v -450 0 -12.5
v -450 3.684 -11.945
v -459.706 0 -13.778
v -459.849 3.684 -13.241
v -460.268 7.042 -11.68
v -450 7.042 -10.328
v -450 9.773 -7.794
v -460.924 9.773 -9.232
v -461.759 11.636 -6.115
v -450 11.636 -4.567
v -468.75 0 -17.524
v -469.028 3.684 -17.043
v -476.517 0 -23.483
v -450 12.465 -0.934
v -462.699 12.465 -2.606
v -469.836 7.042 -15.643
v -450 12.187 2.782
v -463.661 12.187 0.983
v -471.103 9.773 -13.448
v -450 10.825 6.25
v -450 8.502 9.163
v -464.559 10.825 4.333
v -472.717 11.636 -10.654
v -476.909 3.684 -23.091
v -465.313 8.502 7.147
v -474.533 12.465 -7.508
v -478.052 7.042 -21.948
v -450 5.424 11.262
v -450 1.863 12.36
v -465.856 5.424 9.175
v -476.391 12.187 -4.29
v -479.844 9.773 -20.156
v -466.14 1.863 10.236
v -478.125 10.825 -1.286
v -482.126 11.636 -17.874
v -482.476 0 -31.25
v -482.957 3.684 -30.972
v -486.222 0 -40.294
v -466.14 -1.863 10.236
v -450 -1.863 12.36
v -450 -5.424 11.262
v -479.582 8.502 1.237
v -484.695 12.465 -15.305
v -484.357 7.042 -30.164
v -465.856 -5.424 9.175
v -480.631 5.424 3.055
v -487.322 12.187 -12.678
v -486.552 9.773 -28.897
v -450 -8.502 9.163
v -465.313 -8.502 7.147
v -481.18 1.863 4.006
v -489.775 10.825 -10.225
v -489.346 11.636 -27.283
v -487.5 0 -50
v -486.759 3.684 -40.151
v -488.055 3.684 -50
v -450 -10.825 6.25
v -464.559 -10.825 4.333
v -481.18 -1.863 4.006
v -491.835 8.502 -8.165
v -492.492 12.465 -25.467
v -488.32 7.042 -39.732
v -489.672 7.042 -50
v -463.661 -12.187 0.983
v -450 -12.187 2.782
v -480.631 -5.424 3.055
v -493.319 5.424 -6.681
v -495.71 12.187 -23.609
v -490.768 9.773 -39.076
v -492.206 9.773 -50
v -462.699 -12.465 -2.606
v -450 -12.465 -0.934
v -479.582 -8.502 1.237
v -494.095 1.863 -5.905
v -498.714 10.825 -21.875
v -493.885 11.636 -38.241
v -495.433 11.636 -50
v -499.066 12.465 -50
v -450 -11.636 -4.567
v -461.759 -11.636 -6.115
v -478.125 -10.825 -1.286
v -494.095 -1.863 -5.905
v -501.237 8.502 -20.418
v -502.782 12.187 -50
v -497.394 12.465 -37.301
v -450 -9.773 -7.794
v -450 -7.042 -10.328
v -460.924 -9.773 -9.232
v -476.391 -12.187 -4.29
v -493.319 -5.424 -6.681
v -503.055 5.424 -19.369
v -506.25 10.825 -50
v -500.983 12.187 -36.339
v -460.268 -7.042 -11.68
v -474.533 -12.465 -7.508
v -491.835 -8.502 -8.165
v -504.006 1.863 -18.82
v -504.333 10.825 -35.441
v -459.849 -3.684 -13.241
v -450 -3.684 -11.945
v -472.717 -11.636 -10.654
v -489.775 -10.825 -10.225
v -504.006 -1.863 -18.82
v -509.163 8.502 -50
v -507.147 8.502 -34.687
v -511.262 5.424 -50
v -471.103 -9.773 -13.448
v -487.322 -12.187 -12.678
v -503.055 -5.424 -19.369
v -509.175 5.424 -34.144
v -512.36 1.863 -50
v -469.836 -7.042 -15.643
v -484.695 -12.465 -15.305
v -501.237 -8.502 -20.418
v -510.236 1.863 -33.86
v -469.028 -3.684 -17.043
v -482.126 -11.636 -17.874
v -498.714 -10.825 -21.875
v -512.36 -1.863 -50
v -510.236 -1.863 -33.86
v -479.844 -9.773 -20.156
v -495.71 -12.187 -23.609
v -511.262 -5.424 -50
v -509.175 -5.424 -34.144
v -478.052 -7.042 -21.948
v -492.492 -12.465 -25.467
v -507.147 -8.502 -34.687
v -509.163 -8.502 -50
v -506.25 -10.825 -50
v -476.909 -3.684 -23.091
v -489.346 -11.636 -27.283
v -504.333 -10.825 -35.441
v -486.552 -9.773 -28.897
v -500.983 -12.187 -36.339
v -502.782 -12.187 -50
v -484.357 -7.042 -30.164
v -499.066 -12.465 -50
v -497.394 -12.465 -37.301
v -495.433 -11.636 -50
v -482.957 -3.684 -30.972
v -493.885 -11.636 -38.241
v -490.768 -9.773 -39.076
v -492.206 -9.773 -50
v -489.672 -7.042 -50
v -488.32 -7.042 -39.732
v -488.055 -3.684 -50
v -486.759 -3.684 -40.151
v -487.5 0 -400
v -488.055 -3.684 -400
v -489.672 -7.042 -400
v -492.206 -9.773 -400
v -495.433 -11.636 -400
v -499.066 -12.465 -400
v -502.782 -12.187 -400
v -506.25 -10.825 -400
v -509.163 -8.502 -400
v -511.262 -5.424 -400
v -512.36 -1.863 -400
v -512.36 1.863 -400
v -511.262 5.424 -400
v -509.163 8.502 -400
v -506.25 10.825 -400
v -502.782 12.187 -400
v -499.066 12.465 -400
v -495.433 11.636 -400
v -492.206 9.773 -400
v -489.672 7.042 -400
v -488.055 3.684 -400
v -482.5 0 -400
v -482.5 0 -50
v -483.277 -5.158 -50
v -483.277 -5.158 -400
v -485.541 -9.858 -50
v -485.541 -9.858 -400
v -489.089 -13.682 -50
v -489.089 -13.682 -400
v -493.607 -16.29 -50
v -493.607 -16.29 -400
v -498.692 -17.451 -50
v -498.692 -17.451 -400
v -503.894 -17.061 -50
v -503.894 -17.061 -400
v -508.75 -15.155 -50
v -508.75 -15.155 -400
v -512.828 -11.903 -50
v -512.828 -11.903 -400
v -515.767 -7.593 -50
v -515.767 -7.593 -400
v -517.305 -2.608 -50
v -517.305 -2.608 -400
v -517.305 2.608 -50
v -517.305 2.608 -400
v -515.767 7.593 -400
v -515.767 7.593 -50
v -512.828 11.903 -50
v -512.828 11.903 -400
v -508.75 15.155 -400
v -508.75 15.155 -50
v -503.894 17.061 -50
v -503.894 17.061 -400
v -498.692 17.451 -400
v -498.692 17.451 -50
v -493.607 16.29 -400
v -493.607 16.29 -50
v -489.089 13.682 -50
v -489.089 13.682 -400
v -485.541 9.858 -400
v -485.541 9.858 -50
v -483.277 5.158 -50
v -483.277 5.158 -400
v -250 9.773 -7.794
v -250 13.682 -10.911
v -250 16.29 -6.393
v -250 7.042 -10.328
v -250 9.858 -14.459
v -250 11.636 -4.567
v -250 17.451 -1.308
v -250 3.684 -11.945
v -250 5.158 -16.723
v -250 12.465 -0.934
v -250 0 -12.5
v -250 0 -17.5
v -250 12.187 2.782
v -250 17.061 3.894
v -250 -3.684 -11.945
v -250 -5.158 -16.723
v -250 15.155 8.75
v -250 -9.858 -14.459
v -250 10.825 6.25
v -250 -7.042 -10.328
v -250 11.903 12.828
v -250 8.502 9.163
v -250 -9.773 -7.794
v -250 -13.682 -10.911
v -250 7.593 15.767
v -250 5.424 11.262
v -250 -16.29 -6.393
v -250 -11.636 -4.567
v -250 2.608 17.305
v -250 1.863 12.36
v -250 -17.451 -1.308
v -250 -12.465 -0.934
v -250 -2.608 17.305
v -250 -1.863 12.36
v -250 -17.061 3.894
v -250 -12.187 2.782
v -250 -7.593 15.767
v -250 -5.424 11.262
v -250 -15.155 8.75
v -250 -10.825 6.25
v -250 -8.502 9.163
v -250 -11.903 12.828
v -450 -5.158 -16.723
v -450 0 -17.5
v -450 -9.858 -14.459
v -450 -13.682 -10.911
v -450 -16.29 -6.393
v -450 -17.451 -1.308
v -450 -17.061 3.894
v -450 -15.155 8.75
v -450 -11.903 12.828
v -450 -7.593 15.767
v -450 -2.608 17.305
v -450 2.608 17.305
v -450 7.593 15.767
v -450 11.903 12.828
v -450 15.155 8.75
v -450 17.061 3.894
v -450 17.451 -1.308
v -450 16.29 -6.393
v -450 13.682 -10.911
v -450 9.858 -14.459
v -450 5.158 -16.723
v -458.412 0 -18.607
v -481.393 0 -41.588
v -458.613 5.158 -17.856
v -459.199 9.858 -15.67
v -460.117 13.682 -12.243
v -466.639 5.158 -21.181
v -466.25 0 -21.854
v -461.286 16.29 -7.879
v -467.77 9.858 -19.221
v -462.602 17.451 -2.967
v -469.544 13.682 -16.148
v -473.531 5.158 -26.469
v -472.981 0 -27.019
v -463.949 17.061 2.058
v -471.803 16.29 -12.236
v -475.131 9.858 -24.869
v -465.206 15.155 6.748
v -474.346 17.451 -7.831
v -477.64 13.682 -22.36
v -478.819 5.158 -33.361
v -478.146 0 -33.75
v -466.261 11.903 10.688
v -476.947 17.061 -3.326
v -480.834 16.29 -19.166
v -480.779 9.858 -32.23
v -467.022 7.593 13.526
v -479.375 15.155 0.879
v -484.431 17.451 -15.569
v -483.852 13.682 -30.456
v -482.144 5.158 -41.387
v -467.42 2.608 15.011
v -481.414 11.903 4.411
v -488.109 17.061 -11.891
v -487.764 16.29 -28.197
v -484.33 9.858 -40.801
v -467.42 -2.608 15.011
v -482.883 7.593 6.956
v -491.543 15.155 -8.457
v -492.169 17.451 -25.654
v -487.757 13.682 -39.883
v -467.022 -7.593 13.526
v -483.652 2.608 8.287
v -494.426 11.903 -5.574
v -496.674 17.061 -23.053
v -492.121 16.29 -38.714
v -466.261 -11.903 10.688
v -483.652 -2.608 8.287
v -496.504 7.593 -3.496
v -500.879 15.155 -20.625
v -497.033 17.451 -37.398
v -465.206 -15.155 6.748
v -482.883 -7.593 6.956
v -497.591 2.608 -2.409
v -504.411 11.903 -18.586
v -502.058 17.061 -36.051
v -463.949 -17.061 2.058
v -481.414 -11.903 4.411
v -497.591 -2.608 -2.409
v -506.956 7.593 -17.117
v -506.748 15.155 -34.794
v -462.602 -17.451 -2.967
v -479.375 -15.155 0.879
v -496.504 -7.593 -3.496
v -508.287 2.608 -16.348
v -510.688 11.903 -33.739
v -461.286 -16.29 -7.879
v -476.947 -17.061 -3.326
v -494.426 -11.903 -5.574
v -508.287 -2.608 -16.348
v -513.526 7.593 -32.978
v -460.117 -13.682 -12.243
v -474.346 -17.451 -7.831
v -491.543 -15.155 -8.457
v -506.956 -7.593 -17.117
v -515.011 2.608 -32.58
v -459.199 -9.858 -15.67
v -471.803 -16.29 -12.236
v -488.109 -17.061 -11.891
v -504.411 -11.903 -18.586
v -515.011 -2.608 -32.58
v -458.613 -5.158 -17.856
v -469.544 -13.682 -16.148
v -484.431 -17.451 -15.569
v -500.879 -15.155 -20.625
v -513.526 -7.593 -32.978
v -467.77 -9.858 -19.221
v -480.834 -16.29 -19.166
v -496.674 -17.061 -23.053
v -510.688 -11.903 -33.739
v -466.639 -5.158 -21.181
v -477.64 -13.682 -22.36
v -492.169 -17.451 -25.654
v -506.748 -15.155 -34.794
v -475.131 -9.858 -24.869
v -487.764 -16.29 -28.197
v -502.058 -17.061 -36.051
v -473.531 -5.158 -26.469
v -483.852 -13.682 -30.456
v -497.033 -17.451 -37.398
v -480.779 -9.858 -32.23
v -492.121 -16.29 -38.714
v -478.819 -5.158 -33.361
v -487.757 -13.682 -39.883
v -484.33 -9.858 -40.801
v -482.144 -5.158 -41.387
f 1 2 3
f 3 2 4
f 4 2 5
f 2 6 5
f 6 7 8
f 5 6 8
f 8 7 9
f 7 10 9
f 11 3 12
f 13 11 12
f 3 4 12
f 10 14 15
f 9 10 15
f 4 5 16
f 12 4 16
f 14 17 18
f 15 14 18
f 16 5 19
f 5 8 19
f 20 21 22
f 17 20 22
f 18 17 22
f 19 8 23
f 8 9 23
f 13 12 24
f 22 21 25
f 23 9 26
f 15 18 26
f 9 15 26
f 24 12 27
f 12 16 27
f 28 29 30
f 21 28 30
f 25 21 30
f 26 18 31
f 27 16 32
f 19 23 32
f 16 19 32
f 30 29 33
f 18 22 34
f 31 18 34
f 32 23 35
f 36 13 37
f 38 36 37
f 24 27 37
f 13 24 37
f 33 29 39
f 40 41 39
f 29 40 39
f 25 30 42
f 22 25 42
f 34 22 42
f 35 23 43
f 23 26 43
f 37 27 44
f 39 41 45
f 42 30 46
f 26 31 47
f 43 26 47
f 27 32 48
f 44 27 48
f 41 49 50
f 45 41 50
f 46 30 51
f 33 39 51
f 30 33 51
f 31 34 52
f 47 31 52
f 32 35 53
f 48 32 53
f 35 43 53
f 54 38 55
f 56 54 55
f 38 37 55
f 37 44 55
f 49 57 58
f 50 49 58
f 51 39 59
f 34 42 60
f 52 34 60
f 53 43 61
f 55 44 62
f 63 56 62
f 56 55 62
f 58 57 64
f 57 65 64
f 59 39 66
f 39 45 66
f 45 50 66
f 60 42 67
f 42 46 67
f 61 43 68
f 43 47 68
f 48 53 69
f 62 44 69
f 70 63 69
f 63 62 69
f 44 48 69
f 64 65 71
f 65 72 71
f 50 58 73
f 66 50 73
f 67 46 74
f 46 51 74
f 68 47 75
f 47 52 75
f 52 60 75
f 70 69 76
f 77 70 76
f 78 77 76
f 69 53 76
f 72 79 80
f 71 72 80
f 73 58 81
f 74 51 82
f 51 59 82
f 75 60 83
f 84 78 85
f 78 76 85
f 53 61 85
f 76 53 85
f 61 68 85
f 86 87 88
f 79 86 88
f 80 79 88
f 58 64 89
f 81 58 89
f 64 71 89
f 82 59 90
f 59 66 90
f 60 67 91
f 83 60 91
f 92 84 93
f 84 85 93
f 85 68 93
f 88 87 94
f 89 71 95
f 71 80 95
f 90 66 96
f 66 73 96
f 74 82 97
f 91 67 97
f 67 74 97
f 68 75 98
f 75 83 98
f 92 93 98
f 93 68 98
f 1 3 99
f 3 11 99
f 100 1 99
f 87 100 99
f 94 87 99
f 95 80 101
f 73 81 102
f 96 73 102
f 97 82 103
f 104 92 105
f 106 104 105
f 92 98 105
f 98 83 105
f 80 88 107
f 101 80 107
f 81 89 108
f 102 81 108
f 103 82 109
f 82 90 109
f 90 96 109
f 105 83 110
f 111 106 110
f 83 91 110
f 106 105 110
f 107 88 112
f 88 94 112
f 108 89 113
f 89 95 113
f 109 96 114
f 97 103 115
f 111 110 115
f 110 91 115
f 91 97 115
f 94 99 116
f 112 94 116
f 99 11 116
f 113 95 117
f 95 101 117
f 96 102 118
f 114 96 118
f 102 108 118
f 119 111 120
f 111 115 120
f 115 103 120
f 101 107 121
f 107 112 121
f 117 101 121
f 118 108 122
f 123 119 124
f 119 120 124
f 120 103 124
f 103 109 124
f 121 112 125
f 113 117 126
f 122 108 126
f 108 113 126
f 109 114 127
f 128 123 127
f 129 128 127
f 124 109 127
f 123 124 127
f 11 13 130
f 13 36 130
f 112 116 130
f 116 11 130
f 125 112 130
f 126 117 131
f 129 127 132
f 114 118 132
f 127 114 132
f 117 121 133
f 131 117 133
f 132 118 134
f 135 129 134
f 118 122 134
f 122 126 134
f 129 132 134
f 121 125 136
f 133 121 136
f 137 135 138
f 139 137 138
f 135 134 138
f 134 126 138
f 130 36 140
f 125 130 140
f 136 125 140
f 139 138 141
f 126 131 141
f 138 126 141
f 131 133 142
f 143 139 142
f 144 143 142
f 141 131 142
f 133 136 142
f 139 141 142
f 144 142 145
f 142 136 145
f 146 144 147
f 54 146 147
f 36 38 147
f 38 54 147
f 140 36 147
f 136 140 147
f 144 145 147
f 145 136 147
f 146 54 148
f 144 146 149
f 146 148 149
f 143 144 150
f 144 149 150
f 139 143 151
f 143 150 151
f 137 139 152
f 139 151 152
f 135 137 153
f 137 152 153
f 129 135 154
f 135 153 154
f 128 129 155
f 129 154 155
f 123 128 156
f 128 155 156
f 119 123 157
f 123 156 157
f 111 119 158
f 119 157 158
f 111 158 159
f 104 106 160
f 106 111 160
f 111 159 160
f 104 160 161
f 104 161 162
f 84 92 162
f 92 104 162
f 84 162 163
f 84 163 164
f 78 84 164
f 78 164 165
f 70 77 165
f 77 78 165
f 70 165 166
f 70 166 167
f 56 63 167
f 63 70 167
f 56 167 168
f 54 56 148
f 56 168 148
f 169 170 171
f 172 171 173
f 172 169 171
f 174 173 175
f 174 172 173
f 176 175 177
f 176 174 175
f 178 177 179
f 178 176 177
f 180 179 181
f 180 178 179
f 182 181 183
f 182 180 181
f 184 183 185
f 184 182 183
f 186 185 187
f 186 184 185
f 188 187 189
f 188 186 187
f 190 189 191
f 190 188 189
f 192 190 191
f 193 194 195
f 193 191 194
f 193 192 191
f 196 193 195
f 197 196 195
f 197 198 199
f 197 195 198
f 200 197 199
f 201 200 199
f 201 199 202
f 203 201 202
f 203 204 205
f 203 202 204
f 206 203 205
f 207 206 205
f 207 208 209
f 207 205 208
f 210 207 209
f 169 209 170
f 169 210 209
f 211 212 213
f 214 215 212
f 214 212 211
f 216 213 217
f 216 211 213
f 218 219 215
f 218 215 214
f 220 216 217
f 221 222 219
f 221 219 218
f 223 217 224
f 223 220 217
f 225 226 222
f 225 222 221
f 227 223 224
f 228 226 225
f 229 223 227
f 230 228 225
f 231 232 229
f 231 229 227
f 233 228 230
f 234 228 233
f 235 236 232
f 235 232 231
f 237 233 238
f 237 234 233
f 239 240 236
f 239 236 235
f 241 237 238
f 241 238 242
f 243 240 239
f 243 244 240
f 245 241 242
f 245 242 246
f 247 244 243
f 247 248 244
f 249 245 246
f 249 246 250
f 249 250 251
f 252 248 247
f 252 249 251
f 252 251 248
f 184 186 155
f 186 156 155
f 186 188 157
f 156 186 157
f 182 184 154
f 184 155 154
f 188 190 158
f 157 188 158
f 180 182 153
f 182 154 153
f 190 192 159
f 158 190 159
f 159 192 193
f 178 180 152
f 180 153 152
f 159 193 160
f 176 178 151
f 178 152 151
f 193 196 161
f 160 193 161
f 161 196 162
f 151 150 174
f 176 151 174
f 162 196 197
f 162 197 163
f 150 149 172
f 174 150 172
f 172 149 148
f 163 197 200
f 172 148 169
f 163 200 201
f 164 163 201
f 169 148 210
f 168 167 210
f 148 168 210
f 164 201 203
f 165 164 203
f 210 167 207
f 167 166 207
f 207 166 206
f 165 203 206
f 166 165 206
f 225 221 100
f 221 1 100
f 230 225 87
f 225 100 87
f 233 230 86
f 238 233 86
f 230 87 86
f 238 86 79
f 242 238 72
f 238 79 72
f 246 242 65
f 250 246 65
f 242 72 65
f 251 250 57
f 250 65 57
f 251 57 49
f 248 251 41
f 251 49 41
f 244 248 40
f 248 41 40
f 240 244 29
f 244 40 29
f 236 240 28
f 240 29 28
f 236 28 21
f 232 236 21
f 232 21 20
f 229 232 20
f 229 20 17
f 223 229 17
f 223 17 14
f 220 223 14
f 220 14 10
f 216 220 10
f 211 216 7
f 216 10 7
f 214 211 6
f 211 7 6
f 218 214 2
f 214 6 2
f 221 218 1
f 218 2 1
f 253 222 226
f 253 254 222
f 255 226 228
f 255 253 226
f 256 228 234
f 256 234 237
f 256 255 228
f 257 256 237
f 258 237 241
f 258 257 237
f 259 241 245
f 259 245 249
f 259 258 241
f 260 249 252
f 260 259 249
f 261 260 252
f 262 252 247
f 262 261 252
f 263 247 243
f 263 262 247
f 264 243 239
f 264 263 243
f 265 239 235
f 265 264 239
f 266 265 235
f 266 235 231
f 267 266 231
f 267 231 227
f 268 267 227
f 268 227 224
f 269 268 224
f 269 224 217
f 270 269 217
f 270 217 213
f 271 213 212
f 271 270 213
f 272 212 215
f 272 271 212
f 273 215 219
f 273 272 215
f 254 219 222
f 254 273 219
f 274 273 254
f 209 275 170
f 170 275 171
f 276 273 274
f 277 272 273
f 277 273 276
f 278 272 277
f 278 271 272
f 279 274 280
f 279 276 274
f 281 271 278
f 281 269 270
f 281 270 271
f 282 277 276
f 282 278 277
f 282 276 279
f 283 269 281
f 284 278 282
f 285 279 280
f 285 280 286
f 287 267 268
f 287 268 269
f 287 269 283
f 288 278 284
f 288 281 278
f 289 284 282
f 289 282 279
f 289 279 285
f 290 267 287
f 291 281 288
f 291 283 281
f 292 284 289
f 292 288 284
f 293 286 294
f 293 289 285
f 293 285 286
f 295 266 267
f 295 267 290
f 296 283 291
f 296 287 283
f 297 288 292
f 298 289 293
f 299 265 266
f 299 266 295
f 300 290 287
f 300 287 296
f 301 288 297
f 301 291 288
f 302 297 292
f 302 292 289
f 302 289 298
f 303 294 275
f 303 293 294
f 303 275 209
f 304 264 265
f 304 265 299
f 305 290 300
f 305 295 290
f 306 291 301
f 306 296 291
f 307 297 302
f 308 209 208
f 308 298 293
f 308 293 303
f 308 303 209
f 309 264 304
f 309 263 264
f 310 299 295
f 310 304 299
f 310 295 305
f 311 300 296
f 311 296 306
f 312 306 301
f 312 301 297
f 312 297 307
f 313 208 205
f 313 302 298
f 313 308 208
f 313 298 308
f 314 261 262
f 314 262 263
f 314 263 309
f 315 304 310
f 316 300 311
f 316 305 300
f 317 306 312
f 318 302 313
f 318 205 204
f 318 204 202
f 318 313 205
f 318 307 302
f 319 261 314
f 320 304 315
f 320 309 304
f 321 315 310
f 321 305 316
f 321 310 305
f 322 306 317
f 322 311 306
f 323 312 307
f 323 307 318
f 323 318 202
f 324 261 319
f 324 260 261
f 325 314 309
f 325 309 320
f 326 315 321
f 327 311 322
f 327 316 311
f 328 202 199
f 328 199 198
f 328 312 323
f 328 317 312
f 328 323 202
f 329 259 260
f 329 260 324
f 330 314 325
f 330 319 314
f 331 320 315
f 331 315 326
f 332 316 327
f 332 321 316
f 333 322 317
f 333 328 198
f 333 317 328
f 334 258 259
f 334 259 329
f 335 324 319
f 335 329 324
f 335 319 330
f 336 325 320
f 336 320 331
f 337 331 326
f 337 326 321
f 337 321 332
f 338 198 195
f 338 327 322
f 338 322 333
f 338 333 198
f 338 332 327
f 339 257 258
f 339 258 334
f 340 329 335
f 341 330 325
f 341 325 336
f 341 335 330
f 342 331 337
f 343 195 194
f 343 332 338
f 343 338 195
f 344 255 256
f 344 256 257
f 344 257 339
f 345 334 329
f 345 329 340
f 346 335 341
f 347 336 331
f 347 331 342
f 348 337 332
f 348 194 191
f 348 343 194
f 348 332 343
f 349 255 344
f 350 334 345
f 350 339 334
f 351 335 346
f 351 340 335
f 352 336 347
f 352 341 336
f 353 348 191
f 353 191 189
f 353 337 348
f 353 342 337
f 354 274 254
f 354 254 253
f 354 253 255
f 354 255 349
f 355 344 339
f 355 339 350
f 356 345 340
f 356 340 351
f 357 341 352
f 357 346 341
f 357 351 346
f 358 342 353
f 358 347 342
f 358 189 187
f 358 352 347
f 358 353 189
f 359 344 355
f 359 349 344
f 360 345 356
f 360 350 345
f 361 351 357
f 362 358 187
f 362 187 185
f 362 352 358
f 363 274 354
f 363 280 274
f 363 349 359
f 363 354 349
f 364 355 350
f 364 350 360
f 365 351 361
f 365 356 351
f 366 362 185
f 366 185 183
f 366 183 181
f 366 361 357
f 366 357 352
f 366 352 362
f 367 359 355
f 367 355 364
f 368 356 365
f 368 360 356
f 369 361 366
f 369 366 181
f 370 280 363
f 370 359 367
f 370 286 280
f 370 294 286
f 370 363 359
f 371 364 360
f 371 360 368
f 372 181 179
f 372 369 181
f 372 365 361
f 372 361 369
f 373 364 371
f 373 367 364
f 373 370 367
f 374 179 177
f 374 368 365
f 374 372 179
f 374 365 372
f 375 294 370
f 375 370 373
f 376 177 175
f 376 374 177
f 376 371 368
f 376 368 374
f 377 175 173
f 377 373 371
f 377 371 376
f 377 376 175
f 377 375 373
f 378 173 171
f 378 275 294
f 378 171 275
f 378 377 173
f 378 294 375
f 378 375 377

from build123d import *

# Parameters (mm, degrees)
SKETCH_1_R          = 17.5
SKETCH_1_R_2        = 12.5
CUT_EXTRUDE_3_REACH = 483.521
SKETCH_3_R          = 17.5
SKETCH_3_R_2        = 12.5


with BuildPart() as part:
    # 扫描1: sweep along a path in 草图2
    with BuildLine(Plane(origin=(0, 0, 0), x_dir=(1, 0, 0), z_dir=(0, 1, 0))) as sweep_1_path:
        Line((0, 0), (-450, 0))
        ThreePointArc((-450, 0), (-485.355339059, 14.644660941), (-500, 50))
        Line((-500, 50), (-500, 400))
    # 草图1 → 扫描1 (sweep)
    with BuildSketch(Plane(origin=(0, 0, 0), x_dir=(0, 0, -1), z_dir=(1, 0, 0))):
        Circle(SKETCH_1_R)
        Circle(SKETCH_1_R_2, mode=Mode.SUBTRACT)
    sweep(path=sweep_1_path.line)

    # 草图3 → 切除-拉伸3 (cut, up to next)
    with BuildSketch(Plane(origin=(-250, 0, 0), x_dir=(0, 0, -1), z_dir=(1, 0, 0)), mode=Mode.PRIVATE) as cut_extrude_3_sk1:
        with Locations(Location((0, 0, 0), (0, 0, 180))):
            Circle(SKETCH_3_R)
        with Locations(Location((0, 0, 0), (0, 0, 180))):
            Circle(SKETCH_3_R_2, mode=Mode.SUBTRACT)
    cut_extrude_3_tool1 = extrude(cut_extrude_3_sk1.sketch, amount=CUT_EXTRUDE_3_REACH, mode=Mode.PRIVATE) & part.part
    add(cut_extrude_3_tool1.solids().sort_by_distance((-250, 0, -17.005025))[0], mode=Mode.SUBTRACT)


solid = part.part
